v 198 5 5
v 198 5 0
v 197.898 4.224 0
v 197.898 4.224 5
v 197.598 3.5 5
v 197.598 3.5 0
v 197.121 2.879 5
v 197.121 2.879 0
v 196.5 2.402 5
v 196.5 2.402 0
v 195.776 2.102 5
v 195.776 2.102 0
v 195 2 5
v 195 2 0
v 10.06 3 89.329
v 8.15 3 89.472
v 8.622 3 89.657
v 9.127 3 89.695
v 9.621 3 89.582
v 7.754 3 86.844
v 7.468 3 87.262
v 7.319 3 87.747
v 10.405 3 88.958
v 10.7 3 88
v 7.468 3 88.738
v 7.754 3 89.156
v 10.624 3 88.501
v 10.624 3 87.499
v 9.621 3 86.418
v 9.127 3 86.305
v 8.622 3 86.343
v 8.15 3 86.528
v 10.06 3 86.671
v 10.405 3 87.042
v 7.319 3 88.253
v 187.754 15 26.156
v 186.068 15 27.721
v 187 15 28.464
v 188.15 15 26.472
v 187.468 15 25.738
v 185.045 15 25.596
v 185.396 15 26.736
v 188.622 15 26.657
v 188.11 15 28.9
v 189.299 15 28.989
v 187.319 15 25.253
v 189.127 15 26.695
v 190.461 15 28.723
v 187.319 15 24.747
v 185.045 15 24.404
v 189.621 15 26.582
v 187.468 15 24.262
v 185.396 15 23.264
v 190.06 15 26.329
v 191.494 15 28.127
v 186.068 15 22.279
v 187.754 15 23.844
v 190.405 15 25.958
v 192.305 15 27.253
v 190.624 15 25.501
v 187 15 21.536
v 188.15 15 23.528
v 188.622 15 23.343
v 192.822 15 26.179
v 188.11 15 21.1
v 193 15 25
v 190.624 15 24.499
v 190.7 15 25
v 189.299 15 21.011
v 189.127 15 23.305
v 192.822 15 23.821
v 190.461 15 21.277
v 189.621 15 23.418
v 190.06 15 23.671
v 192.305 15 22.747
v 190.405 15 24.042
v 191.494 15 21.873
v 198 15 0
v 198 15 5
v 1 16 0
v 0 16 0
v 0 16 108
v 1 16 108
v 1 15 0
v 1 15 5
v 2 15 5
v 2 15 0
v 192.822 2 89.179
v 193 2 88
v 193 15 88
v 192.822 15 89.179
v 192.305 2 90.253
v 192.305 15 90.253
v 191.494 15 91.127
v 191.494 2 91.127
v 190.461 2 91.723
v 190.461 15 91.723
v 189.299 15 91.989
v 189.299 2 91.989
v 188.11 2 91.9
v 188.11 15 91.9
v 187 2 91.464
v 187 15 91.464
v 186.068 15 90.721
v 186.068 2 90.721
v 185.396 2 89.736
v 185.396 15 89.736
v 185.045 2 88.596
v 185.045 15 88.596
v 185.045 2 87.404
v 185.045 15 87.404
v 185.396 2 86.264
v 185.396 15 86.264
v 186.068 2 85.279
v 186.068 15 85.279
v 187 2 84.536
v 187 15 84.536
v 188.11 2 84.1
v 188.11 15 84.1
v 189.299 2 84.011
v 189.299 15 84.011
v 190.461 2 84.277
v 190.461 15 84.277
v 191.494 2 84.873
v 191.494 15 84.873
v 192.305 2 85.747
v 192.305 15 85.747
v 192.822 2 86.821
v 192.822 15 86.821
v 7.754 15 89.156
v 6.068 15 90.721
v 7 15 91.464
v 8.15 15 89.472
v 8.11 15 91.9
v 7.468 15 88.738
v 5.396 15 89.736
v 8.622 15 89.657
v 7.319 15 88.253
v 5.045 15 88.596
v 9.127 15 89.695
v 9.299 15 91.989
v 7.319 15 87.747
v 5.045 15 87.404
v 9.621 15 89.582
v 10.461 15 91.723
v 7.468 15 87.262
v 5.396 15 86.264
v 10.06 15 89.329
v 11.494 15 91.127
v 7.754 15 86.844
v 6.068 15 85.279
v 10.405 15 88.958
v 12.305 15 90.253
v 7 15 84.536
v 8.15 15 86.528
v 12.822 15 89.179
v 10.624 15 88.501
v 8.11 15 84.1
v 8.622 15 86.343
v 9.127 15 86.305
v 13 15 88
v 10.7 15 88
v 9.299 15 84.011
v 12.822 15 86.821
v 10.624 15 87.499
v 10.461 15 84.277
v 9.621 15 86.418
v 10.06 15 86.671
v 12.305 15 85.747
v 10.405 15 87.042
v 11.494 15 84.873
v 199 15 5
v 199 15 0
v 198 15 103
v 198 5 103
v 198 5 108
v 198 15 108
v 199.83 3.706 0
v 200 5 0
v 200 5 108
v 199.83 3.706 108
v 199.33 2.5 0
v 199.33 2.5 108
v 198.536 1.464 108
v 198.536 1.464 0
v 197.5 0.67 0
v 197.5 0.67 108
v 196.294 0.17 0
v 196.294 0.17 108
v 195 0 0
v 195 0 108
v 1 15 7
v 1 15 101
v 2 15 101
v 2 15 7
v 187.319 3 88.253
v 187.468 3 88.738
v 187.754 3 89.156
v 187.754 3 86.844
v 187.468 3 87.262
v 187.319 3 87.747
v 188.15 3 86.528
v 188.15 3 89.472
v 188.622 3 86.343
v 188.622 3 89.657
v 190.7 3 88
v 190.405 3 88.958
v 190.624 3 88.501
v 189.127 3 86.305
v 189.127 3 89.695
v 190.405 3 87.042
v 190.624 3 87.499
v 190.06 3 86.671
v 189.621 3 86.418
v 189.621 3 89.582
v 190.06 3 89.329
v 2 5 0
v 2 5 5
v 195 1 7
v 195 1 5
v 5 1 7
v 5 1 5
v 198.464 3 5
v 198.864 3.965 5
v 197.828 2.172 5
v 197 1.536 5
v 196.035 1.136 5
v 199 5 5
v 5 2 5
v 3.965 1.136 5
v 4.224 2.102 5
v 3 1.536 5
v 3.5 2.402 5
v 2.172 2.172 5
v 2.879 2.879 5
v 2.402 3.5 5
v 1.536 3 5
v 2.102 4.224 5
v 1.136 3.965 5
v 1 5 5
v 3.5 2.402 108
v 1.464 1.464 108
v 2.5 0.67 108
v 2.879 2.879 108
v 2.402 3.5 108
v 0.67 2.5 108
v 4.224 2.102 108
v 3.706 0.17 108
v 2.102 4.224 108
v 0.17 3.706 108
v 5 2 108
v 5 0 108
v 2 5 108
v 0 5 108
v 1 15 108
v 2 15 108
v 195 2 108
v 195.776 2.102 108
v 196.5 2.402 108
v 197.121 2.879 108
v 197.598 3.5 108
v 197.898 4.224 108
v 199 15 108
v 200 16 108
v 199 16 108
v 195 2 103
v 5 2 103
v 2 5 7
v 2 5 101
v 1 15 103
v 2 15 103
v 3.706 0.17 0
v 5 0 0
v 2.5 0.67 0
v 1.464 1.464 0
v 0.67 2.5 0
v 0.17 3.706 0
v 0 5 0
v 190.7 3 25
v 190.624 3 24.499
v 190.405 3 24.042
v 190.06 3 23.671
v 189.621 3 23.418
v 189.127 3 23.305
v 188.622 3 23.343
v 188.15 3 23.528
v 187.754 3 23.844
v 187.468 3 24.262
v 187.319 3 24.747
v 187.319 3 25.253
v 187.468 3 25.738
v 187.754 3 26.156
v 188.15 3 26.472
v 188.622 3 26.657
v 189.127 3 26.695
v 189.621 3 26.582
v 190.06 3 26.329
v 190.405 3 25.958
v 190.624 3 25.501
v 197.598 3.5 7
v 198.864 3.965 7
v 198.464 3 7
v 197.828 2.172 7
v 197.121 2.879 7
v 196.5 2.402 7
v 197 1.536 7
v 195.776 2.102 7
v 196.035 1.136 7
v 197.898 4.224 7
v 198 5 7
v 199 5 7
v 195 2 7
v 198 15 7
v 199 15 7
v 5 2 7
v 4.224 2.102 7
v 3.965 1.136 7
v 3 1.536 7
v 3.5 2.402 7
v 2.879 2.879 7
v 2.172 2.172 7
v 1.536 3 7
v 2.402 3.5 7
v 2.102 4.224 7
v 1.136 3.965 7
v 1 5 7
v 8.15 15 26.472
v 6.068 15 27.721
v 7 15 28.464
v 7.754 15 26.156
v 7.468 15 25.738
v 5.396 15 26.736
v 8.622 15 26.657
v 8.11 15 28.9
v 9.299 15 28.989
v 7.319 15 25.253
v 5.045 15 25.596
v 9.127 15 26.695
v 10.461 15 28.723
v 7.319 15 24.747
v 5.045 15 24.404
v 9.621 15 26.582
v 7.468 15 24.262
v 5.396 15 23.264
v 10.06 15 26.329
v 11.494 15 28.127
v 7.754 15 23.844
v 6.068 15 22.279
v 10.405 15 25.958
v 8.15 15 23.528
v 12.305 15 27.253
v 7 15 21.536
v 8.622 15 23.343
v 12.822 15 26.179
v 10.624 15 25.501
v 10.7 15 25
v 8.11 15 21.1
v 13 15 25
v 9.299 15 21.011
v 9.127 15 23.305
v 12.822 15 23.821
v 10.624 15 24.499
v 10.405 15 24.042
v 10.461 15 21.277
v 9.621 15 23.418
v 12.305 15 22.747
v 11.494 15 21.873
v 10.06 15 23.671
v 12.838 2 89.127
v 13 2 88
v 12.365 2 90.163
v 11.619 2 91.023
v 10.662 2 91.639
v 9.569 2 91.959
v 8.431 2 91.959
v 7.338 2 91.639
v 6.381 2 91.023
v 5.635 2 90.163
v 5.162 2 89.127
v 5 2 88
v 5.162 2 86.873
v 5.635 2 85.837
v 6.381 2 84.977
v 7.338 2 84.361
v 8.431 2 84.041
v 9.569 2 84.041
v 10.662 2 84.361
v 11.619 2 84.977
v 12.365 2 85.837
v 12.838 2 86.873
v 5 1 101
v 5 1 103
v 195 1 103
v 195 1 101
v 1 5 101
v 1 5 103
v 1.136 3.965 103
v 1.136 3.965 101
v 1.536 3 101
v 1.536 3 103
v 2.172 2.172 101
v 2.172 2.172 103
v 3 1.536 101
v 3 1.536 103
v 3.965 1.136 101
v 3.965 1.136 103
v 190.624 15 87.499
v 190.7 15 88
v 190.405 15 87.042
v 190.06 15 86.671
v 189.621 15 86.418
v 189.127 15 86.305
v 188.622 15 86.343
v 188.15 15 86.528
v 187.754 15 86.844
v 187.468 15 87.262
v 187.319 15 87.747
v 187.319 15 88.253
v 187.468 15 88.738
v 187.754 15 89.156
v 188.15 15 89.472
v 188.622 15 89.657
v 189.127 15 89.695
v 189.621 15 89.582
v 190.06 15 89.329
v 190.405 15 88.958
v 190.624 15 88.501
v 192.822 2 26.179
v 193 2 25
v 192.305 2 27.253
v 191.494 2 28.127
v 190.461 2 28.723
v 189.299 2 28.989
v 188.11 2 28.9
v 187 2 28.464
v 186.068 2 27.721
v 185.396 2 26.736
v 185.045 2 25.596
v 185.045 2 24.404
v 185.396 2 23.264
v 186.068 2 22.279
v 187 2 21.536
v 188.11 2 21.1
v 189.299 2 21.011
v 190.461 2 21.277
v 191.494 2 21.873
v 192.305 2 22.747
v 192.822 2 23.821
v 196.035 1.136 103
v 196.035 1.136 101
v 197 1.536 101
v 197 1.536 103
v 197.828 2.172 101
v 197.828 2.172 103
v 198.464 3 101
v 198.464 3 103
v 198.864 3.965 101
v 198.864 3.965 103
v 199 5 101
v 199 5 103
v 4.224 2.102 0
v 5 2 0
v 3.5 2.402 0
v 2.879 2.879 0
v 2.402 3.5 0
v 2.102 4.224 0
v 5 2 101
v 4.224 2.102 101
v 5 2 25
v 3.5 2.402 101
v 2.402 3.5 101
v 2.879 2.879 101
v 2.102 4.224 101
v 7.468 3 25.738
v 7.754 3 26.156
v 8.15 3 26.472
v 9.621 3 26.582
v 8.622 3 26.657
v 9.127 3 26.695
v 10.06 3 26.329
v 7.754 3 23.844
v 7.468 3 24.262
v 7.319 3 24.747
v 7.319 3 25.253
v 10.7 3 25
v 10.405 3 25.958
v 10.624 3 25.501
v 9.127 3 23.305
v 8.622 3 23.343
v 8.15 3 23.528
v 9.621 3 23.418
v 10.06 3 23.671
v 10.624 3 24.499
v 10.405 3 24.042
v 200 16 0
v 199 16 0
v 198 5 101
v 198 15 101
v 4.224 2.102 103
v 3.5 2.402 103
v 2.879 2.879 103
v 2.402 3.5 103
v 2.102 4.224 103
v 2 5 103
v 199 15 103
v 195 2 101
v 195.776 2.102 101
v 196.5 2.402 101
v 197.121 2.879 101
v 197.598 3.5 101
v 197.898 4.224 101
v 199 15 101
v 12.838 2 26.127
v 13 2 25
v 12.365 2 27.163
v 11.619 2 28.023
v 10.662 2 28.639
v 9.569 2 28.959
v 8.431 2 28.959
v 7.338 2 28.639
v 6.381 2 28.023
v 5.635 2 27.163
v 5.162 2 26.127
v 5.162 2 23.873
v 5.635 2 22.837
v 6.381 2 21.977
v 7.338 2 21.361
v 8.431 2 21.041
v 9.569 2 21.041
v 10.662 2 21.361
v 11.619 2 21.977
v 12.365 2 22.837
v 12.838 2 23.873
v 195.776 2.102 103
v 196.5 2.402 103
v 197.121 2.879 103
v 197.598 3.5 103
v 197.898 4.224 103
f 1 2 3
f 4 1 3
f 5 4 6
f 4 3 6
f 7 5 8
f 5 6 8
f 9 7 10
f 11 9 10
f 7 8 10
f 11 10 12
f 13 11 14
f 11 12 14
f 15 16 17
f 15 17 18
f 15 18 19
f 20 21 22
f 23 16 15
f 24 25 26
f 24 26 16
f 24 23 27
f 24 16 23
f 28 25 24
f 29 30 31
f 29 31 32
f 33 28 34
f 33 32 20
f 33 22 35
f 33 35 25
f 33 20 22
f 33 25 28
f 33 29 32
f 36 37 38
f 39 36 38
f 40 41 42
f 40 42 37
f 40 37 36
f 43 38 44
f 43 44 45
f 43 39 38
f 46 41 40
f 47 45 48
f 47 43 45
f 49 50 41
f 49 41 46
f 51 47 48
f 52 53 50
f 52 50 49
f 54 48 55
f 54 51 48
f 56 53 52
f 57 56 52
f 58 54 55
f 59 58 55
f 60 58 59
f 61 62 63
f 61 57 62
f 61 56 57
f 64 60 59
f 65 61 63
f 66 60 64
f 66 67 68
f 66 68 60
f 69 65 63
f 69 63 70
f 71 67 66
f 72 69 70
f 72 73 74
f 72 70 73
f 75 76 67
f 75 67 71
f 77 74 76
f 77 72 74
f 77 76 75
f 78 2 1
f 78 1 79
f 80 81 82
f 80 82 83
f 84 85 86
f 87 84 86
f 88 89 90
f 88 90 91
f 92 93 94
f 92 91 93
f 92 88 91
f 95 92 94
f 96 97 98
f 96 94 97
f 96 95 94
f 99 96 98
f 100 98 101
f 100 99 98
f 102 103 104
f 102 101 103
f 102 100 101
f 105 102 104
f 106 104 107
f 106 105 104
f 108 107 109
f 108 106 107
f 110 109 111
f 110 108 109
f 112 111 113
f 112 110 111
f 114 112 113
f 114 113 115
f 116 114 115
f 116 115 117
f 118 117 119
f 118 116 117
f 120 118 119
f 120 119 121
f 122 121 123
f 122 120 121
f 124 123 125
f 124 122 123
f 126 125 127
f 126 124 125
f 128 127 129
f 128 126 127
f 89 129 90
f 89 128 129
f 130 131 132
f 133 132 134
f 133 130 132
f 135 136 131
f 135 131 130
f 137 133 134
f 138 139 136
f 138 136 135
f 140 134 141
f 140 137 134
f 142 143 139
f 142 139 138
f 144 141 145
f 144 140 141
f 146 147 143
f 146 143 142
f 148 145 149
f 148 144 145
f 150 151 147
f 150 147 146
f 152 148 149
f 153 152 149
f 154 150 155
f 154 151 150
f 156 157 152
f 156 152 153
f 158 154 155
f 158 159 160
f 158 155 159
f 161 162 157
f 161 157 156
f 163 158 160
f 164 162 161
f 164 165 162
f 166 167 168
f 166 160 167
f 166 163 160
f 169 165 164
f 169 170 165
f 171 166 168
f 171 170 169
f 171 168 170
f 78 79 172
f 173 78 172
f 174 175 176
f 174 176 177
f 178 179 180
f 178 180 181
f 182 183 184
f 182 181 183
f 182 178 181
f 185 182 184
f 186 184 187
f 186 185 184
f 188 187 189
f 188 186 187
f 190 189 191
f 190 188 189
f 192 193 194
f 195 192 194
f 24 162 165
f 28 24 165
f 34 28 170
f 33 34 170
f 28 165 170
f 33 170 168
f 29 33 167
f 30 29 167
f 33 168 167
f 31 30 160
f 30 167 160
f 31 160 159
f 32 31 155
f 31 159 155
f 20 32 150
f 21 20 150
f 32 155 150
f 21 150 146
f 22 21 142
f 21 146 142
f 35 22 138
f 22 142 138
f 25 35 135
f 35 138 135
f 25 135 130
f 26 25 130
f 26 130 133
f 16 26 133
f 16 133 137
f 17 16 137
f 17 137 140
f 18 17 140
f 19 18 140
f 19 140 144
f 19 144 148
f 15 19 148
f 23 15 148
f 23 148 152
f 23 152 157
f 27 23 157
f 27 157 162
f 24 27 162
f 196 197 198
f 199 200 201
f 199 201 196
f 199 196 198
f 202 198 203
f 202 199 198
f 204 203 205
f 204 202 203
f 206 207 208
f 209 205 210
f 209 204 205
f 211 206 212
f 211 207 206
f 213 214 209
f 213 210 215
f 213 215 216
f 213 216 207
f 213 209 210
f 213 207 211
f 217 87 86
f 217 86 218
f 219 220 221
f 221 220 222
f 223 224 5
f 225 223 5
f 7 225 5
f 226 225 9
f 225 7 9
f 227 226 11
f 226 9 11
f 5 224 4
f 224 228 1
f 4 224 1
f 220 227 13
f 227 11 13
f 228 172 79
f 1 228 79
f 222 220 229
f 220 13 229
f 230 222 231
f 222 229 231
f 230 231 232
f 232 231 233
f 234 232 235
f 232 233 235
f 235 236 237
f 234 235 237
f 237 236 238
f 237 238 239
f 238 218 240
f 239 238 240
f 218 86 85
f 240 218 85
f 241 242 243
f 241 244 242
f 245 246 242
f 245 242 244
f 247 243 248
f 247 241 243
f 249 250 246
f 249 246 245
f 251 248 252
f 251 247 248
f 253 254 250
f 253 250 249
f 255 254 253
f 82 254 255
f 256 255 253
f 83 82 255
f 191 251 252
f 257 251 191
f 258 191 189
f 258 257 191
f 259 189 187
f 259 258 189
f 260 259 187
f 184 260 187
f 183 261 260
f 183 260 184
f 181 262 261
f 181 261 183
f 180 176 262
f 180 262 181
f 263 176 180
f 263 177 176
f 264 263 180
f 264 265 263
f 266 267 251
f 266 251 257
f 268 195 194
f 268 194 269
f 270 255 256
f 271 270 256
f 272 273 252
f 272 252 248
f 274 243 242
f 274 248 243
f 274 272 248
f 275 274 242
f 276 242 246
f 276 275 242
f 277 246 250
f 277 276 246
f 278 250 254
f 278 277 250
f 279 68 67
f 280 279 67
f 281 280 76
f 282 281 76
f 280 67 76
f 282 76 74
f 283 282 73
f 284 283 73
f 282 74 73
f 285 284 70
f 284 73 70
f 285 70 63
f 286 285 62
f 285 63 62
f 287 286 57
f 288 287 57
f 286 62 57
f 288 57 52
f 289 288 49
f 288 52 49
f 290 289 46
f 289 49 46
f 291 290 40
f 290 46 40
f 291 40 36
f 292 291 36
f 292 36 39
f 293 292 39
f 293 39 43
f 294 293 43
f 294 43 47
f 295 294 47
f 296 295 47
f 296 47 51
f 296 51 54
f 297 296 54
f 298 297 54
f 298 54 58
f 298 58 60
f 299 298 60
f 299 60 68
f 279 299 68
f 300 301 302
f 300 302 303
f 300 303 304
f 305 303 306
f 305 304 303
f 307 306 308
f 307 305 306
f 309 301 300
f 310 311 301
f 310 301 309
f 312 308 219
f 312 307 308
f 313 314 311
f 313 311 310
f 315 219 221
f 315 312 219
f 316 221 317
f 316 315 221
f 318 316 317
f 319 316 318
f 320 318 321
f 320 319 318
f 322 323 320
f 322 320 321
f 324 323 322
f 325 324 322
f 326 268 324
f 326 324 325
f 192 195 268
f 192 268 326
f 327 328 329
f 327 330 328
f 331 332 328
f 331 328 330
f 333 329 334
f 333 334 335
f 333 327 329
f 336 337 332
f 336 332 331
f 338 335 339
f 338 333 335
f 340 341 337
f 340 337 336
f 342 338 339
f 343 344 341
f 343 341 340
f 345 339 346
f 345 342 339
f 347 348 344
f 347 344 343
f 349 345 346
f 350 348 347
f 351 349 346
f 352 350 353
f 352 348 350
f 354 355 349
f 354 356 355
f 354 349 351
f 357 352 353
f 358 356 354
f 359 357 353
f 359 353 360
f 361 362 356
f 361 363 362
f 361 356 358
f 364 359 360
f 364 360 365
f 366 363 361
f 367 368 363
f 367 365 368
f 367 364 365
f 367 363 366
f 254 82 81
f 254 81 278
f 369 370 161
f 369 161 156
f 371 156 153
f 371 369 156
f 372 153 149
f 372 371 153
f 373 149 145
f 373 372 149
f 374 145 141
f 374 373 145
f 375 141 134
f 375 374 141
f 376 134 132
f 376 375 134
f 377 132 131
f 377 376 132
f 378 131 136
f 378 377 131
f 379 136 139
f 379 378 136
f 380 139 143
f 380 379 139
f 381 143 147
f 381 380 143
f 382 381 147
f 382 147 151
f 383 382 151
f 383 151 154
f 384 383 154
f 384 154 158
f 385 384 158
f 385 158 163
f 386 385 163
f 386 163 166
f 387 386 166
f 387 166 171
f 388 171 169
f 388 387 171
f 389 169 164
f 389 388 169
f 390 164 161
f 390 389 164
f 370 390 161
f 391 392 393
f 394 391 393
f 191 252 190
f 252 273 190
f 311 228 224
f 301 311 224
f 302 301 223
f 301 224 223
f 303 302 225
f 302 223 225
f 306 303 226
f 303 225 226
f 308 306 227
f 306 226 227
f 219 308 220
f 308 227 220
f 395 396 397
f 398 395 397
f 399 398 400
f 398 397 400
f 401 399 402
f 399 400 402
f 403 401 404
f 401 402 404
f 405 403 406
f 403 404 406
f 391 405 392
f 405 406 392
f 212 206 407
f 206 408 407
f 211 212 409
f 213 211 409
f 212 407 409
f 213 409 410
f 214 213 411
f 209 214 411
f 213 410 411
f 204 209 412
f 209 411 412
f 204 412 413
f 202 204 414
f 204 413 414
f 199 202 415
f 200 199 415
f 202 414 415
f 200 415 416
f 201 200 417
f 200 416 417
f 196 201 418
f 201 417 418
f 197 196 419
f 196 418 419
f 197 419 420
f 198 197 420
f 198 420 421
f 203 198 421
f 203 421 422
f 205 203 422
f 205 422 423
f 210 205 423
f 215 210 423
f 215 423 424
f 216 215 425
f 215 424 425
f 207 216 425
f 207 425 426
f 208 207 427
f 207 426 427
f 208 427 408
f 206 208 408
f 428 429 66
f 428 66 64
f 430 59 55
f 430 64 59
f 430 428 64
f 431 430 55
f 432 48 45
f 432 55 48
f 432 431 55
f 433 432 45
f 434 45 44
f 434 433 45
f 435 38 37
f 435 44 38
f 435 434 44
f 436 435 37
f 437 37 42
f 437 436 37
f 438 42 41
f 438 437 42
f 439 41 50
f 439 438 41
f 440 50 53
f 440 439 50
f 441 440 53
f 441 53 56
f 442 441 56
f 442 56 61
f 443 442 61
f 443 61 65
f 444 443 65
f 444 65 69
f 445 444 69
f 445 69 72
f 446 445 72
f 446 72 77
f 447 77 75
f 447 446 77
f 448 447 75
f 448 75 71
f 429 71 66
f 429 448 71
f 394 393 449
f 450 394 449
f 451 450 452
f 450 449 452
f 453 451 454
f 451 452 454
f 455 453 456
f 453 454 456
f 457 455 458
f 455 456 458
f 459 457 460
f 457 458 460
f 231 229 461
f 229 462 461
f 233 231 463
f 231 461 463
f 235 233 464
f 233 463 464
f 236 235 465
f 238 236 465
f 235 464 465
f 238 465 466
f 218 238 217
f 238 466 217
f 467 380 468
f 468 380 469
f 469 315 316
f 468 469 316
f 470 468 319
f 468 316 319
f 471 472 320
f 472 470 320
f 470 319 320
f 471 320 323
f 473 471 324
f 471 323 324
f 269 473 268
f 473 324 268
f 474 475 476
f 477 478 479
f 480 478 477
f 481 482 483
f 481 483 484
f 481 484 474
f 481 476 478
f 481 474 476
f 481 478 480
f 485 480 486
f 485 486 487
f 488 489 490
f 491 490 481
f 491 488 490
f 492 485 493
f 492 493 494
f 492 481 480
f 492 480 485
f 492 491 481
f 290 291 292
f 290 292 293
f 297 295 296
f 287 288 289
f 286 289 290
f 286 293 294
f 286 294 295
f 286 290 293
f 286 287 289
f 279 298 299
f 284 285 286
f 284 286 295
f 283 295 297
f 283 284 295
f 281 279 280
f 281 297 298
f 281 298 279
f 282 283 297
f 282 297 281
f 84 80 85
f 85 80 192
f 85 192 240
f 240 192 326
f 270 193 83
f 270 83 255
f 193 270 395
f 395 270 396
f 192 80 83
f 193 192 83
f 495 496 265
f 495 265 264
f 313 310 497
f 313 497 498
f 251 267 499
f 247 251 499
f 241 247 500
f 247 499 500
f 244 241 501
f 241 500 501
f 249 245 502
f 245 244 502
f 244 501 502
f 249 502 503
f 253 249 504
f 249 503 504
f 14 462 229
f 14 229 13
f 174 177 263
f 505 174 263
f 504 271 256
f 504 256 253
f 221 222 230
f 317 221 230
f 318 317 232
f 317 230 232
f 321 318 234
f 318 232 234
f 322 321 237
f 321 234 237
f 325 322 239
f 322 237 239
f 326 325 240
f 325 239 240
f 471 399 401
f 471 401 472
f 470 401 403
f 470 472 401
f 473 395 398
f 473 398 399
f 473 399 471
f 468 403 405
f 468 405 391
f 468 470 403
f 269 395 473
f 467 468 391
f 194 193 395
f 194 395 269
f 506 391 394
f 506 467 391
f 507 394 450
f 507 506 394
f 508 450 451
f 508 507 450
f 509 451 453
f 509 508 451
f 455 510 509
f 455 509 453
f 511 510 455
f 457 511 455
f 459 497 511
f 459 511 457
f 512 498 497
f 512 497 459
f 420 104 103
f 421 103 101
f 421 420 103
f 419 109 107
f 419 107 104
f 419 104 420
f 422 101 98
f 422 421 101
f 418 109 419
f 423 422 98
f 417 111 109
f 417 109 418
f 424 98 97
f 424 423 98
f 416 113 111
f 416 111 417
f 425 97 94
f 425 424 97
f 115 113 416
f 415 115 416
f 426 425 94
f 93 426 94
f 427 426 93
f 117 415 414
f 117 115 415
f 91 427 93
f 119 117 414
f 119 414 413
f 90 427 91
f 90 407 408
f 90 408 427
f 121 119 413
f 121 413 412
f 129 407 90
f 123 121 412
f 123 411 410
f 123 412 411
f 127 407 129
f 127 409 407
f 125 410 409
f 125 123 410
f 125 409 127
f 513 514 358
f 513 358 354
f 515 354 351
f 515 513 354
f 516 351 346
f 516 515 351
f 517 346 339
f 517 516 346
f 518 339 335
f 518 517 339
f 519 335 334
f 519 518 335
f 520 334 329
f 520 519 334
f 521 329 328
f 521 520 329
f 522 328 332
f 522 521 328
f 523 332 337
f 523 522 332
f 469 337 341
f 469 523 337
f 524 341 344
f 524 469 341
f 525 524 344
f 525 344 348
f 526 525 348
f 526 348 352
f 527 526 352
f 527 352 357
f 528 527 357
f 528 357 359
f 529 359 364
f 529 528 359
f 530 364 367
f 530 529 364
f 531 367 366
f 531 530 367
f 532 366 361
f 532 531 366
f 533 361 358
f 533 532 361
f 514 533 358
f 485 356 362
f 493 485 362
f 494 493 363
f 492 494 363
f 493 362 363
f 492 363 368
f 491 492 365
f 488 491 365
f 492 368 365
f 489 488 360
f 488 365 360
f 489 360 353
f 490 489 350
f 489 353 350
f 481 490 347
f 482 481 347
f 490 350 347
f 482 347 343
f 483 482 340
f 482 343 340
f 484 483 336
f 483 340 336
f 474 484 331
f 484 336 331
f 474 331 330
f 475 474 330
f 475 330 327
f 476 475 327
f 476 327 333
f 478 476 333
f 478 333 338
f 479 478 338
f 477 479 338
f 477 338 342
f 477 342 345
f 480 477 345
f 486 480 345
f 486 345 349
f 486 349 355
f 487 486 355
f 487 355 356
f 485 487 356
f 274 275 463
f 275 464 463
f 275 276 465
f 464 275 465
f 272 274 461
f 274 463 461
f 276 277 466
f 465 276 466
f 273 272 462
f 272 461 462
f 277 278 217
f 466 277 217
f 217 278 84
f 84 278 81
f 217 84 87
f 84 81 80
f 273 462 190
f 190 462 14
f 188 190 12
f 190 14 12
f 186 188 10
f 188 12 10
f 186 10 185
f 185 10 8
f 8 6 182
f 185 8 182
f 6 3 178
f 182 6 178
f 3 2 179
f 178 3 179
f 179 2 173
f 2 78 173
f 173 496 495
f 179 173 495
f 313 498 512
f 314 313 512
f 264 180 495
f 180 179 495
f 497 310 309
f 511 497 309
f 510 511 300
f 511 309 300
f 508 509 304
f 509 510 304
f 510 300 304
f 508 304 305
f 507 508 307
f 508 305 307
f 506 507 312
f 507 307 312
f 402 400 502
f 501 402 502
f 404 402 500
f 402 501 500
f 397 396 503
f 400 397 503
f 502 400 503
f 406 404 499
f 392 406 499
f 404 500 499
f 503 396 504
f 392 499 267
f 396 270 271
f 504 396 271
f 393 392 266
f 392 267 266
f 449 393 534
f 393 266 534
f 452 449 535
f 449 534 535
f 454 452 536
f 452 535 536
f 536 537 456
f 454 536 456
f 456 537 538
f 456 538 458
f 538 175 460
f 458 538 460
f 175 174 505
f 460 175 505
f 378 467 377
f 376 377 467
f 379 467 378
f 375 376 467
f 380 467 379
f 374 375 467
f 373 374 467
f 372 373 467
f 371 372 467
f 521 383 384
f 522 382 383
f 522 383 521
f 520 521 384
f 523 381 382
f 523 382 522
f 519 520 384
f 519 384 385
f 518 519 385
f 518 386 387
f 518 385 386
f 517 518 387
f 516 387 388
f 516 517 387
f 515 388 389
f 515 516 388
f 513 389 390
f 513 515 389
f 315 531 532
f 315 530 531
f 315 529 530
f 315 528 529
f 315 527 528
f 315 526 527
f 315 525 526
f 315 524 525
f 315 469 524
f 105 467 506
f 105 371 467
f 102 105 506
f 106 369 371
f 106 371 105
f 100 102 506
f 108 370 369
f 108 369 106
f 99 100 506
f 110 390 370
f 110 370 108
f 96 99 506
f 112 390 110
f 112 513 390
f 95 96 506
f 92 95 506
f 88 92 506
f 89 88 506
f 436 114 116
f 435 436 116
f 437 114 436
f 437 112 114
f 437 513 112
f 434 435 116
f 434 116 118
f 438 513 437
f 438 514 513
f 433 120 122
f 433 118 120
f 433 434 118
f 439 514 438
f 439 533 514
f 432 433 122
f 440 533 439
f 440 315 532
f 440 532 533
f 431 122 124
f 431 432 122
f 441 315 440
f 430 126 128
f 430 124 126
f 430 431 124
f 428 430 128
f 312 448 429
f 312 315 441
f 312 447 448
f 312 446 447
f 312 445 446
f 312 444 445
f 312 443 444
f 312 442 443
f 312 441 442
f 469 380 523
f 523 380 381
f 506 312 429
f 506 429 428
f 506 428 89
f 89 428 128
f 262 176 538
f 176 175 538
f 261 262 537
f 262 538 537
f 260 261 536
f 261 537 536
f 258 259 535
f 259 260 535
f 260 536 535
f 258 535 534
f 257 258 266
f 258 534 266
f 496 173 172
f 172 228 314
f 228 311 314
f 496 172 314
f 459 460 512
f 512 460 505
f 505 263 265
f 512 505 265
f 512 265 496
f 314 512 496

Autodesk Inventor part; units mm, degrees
ref_plane "YZ Plane" through (0, 0, 0) normal (1, 0, 0) x (0, 1, 0)
sketch "Sketch1" plane through (0, 0, 0) normal (0, 0, 1) x (1, 0, 0)
  line L0 (0, 16) -> (0, 5)
  line L1 (5, 0) -> (195, 0)
  line L2 (200, 5) -> (200, 16)
  arc A0 (0, 5) -> (5, 0) centre (5, 5) ccw
  arc A1 (195, 0) -> (200, 5) centre (195, 5) ccw
  line L3 (2, 16) -> (2, 5)
  arc A2 (2, 5) -> (5, 2) centre (5, 5) ccw
  line L4 (5, 2) -> (195, 2)
  arc A3 (195, 2) -> (198, 5) centre (195, 5) ccw
  line L5 (198, 5) -> (198, 16)
  line L6 (0, 16) -> (2, 16)
  line L7 (198, 16) -> (200, 16)
  point P0 (0, 0)
  dimension "fillet2" = 5
  dimension "thickness2" = 2
  dimension "caseBottomWidth2" = 200
  dimension "caseBottomHeight2" = 16
extrude "Extrusion1" add sketch "Sketch1" along normal blind 108
ref_plane "Work Plane1" through (0, 0, 103) normal (0, 0, 1) x (1, 0, 0)
sketch "Sketch3" plane through (0, 0, 103) normal (0, 0, 1) x (1, 0, 0)
  line L0 (2, 16) -> (1, 16)
  line L1 (2, 16) -> (2, 5)
  line L2 (1, 16) -> (1, 5)
  line L3 (195, 2) -> (5, 2) projected
  line L4 (195, 2) -> (5, 2)
  line L5 (198, 16) -> (198, 5) projected
  line L6 (198, 16) -> (198, 5)
  line L7 (198, 16) -> (199, 16)
  line L8 (199, 16) -> (199, 5)
  line L9 (5, 1) -> (195, 1)
  arc A0 (2, 5) -> (5, 2) centre (5, 5) ccw
  arc A1 (195, 2) -> (198, 5) centre (195, 5) ccw
  arc A2 (1, 5) -> (5, 1) centre (5, 5) ccw
  arc A3 (195, 1) -> (199, 5) centre (195, 5) ccw
  point P0 (0, 0)
  dimension "d8" = 1
  dimension "d9" = 1
  dimension "d10" = 1
  dimension "filletInner2" = 3
  dimension "filletMid2" = 4
extrude "Extrusion2" cut sketch "Sketch3" against normal blind 2
ref_plane "Work Plane2" through (0, 0, 5) normal (0, 0, -1) x (-1, 0, 0)
sketch "Sketch5" plane through (0, 0, 5) normal (0, 0, -1) x (-1, 0, 0)
  line L0 (-200, 16) -> (-198, 16) projected
  line L1 (-198, 16) -> (-198, 5)
  line L2 (-199, 16) -> (-199, 5)
  line L3 (-2, 5) -> (-2, 16) projected
  line L4 (-2, 16) -> (-2, 5)
  line L5 (-2, 16) -> (0, 16) projected
  line L6 (-1, 16) -> (-1, 5)
  line L7 (-195, 2) -> (-5, 2)
  line L8 (-195, 1) -> (-5, 1)
  line L9 (-195, 2) -> (-5, 2) projected
  arc A0 (-198, 5) -> (-195, 2) centre (-195, 5) ccw
  arc A1 (-5, 2) -> (-2, 5) centre (-5, 5) ccw
  arc A2 (-199, 5) -> (-195, 1) centre (-195, 5) ccw
  arc A3 (-5, 1) -> (-1, 5) centre (-5, 5) ccw
  point P0 (0, 0)
  dimension "d21" = 1
  dimension "d22" = 3
  dimension "d23" = 4
extrude "Extrusion4" cut sketch "Sketch5" against normal blind 2
sketch "Sketch7" plane through (0, 0, 108) normal (0, 0, 1) x (1, 0, 0)
  line L0 (2, 16) -> (0, 16) projected
  line L1 (2, 16) -> (1, 16)
  line L2 (1, 16) -> (1, 15)
  line L3 (1, 15) -> (2, 15)
  line L4 (2, 15) -> (2, 16)
  line L5 (199, 5) -> (199, 16) projected
  line L6 (198, 16) -> (198, 5) projected
  line L7 (199, 16) -> (198, 16)
  line L8 (198, 16) -> (198, 15)
  line L9 (198, 15) -> (199, 15)
  line L10 (199, 15) -> (199, 16)
  point P0 (0, 0)
  dimension "d28" = 1
  dimension "d29" = 1
extrude "Extrusion6" cut sketch "Sketch7" against normal through all
sketch "Sketch8" plane through (5, 2, 101) normal (0, 1, 0) x (1, 0, 0)
  circle A0 centre (4, 76) radius 4
  line L0 (-5, 101) -> (-5, -7) projected
  line L1 (190, 101) -> (0, 101) projected
  circle A1 centre (184, 76) radius 4
  circle A2 centre (4, 13) radius 4
  circle A3 centre (184, 13) radius 4
  dimension "d32" = 9
  dimension "d33" = 25
  dimension "d34" = 8
  dimension "d37" = 180
  dimension "d40" = 63
extrude "Extrusion7" add sketch "Sketch8" along normal blind 13
sketch "Sketch9" plane through (9, 15, 88) normal (0, 1, 0) x (1, 0, 0)
  circle A0 centre (0, 63) radius 4 projected
  circle A1 centre (0, 63) radius 1.7
  circle A2 centre (0, 0) radius 1.7
  circle A3 centre (180, 0) radius 1.7
  circle A4 centre (180, 63) radius 4 projected
  circle A5 centre (180, 63) radius 1.7
  circle A6 centre (180, 0) radius 4 projected
  circle A7 centre (0, 0) radius 4 projected
  point P0 (-9, 88)
  dimension "d45" = 3.4
extrude "Extrusion8" cut sketch "Sketch9" against normal blind 12 contours A1 | A2 | A3 | A5
equation "\"fillet2\" = fillet"
equation "\"thickness2\" = thickness"
equation "\"caseBottomWidth2\" = caseBottomWidth"
equation "\"caseBottomHeight2\" = caseBottomHeight"
equation "\"caseBottomDepth2\" = caseBottomDepth"
equation "\"d8\" = 0.5 * thickness2"
equation "\"d9\" = 0.5 * thickness2"
equation "\"d10\" = 0.5 * thickness2"
equation "\"filletInner2\" = filletInner"
equation "\"filletMid2\" = filletMid"
equation "\"d13\" = thickness2"
equation "\"d21\" = 0.5 * thickness2"
equation "\"d22\" = filletInner2"
equation "\"d23\" = filletMid2"
equation "\"d24\" = thickness2"
equation "\"d28\" = lipHeight"
equation "\"d29\" = 0.5 * thickness"
equation "\"d32\" = caseJoinOffsetFromSide"
equation "\"d33\" = caseJoinOffsetFromBack"
equation "\"d34\" = caseJoinDiameter"
equation "\"d37\" = caseJoinSpacingLeftRight"
equation "\"d40\" = caseJoinSpacingFrontBack"
equation "\"d43\" = caseBottomHeight2 - 1.5 * thickness"
equation "\"d45\" = holeDiameter"
equation "\"d46\" = caseBottomHeight2 - 2 * thickness"
equation "\"frontBackOffset2\" = frontBackOffset"
equation "\"d15\" = frontBackOffset2"
equation "\"fillet\" = 5"
equation "\"thickness\" = 2"
equation "\"caseBottomWidth\" = 200"
equation "\"caseBottomHeight\" = 16"
equation "\"caseBottomDepth\" = 108"
equation "\"filletInner\" = 3"
equation "\"filletMid\" = 4"
equation "\"lipHeight\" = 1"
equation "\"caseJoinOffsetFromSide\" = 9"
equation "\"caseJoinOffsetFromBack\" = 25"
equation "\"caseJoinDiameter\" = 8"
equation "\"caseJoinSpacingLeftRight\" = 180"
equation "\"caseJoinSpacingFrontBack\" = 63"
equation "\"holeDiameter\" = 3.4"
equation "\"frontBackOffset\" = -5"
properties part number "case-bottom"
